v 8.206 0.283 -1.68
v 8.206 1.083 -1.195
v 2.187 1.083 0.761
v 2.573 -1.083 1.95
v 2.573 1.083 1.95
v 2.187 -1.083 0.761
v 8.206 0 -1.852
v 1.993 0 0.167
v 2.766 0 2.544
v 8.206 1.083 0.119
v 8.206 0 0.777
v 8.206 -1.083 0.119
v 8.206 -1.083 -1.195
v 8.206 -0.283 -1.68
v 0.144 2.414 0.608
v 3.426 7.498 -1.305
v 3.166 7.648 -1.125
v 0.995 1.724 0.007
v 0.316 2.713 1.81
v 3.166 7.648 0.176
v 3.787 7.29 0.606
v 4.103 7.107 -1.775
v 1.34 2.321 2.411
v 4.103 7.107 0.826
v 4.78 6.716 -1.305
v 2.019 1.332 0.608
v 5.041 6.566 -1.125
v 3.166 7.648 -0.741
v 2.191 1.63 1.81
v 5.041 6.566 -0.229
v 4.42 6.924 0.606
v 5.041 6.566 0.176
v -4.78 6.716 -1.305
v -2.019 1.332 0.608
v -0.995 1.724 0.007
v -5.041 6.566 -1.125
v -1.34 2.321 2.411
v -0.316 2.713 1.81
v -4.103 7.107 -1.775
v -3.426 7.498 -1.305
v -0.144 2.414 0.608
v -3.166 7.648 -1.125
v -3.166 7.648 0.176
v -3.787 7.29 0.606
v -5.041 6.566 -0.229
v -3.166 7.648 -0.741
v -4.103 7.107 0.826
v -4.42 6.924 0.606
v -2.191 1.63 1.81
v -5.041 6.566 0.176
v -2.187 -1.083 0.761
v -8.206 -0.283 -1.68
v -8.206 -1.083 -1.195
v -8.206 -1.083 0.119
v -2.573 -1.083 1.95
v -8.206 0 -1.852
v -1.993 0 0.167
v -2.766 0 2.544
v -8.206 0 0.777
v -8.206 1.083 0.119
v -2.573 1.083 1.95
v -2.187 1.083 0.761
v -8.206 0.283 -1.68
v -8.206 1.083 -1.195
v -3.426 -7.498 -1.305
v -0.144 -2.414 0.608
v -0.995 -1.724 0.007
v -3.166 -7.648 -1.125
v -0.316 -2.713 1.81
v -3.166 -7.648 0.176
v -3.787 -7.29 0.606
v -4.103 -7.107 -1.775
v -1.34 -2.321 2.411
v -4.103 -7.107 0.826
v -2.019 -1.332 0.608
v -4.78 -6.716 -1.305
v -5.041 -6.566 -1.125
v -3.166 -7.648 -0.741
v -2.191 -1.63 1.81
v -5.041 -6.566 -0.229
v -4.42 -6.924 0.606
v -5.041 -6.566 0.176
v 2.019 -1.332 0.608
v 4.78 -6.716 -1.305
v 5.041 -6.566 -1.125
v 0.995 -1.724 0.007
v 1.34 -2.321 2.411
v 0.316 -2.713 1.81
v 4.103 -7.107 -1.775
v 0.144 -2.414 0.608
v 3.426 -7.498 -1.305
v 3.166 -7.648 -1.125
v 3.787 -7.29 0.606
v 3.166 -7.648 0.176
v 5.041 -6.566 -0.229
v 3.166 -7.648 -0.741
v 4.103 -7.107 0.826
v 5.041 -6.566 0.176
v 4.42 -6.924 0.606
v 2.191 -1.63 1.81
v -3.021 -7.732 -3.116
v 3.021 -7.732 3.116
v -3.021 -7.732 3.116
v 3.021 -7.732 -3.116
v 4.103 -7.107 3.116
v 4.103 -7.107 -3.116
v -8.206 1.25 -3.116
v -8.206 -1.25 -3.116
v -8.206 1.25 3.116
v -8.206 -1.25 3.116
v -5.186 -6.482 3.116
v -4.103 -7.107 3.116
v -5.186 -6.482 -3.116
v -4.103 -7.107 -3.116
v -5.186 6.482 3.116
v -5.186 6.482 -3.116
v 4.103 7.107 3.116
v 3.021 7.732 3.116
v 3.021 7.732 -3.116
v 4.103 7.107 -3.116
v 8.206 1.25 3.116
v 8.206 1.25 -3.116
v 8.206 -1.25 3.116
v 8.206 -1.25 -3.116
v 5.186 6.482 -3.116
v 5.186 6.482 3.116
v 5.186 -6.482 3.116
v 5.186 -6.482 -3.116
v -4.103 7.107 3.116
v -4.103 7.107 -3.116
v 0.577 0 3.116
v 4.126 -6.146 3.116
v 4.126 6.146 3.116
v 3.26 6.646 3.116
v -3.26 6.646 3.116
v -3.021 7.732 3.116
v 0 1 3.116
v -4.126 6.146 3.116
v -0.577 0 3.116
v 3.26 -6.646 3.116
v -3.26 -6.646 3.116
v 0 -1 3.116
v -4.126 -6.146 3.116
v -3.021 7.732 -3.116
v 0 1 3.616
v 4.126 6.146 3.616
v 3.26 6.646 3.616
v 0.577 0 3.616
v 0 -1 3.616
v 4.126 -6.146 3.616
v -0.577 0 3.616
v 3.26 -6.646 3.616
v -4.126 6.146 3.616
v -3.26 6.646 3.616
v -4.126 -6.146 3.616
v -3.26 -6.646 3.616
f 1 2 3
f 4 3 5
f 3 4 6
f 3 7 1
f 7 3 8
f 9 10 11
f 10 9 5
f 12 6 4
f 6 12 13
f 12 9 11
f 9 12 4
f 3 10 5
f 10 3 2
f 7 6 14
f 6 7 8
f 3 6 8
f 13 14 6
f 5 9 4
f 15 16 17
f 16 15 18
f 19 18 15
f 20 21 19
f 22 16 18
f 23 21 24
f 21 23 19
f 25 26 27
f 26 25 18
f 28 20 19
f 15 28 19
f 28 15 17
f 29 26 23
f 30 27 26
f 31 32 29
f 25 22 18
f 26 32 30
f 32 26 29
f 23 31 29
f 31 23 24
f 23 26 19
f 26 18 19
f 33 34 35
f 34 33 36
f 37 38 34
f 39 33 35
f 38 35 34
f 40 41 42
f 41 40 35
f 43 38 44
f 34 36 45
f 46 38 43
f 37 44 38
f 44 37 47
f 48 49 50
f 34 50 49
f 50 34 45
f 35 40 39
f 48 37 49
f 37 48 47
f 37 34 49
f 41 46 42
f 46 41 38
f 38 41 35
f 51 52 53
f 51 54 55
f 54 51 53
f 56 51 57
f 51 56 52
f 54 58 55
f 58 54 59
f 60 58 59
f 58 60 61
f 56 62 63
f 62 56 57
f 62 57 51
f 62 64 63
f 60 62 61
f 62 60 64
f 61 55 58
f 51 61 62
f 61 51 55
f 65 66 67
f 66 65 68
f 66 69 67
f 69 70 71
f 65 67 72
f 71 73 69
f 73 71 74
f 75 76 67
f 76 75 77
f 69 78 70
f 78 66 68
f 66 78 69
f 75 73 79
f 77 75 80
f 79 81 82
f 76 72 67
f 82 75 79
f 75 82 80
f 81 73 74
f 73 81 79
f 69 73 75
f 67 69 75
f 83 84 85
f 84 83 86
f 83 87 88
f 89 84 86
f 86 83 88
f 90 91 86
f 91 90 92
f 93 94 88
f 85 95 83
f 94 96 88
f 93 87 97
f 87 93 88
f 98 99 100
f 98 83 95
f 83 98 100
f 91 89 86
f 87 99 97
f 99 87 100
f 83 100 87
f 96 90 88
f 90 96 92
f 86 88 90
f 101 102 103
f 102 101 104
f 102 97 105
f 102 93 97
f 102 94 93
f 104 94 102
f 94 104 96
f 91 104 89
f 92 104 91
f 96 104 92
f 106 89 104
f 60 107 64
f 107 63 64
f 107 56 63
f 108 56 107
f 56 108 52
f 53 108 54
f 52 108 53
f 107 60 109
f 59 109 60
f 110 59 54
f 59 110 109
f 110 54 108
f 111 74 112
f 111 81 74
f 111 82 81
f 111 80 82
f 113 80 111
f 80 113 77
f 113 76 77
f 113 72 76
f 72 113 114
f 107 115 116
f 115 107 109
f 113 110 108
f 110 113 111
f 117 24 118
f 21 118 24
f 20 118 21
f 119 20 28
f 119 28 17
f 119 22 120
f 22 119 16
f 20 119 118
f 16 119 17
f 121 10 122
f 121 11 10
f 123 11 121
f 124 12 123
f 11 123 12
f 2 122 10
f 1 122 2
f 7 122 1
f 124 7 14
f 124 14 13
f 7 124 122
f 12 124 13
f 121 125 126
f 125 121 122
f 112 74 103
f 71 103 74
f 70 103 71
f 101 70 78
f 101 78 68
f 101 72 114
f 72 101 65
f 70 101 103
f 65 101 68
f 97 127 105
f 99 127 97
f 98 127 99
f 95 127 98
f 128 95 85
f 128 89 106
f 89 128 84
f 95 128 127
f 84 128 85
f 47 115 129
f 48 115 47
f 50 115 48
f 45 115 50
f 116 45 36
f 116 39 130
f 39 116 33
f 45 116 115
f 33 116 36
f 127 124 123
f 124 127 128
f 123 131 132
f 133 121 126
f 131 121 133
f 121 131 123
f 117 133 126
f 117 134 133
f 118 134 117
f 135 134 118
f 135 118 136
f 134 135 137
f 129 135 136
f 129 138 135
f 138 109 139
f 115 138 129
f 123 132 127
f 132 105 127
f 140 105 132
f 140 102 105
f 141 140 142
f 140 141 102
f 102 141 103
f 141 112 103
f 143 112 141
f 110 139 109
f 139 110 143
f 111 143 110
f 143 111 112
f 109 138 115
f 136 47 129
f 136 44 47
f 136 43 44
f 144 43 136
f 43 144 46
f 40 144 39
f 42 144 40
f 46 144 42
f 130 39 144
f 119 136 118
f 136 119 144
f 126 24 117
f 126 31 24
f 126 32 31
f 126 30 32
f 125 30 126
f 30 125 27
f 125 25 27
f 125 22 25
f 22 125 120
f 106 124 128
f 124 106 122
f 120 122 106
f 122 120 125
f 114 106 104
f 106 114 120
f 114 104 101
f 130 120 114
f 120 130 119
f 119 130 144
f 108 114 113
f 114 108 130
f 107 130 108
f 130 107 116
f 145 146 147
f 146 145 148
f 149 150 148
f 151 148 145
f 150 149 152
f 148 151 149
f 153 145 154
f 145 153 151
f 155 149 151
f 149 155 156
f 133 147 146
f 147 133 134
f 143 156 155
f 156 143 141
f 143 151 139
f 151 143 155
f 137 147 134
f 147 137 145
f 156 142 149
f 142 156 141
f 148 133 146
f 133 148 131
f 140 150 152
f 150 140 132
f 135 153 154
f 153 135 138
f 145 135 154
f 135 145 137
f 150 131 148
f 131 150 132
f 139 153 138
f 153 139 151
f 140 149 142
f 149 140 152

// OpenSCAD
//---------------------------------------------------------------------------------------------
//-- Mini-dome.  Derived from the Domekit-2V from effallo
//---------------------------------------------------------------------------------------------
//-- HEXA-CONNECTORS
//-- The connectors are parameterized. On the top there is an "X"
//-- showing the 4 holes were the long sticks should be connected
//---------------------------------------------------------------------------------------------
//-- (c) Jul-2012 Juan Gonzalez-Gomez (Obijuan) juan@iearobotics.com
//-- Released under the GPL license
//--------------------------------------------------------------------------------------------
/* Derived from:
   DOMEKIT-2V • HEXAGON
   http://effalo.com
*/

//-- Two Domes as examples:
//-- All the calculations have been done using this link:
//--  http://simplydifferently.org/Geodesic_Dome_Notes?page=3#2V/L2

/*  EXAMPLE 1 (default): Micro-dome

   Diameter: 150 mm
   Height: 75mm
   20 x Hexa-connectors
   6  x  Penta-connectors
   35 x Long sticks: 46.3mm (Green)
   30 x shot sticks: 41mm (Red)
*/

/*  EXAMPLE 2: Mini-dome

   Diameter: 50cm
   Height: 25cm
   20 x Hexa-connectors
   6  x  Penta-connectors
   35 x Long sticks: 154.5 mm (Green)
   30 x shot sticks: 136.6 mm (Red)
*/


//----------------------------------------------------------------------------------------------------
//--  Module for creating the main body of the hexagonal connectors
//--  Parameters:
//--      r :  Hexagon radius
//--      h:  Hub height
//--      s:  Stick diameter
//-------------------------------------------------------------------------------------------------------
module hexa_hub_main(r,h,s)
{
  hull() {
    cylinder(r=r, h=h,center=true,$fn=6);

     for (i=[0:5]) {
       rotate([0,0,i*60])
         translate([r-s/2,0,0])
           cube([s,s, h],center=true);
    }
  }
}

//----------------------------------------------------------------------------------
//-- Hexagonal connector
//-- Input parameters
//--     sd: stick diameter
//--     holedepth
//--
//--    The total part height and diameter are calculated 
//--   accorting to these two USER parameters
//----------------------------------------------------------------------------------
module hexa_hub(sd=2.5, holedepth=6)
{
  
  //-- Temp variable. Length of the cilinders used for 
  //-- making the drills on the main hub. 

  length = holedepth + sd*sin(18)+2;

  //-- Z angle of the drills. All have 16 degrees except 2 of 18
  zangle = [18,16,16,18,16,16];

  //-- Color of the drills (for debuggin)
  hole_color=["red","blue","blue","red","blue","blue"];

  //-- Calculate the main hub parameters: radius and height
  //-- They are calculated from the stick diameter and holedepth
  hub_r = sd + holedepth*cos(18);
  hub_h = holedepth*sin(18)+sd*cos(18) + 1+1;

  //-- Debugin: Output the calculated parameters
  echo("Diameter: ",2*hub_r);
  echo("Height: ",hub_h);

  //-- The part consist of sub-parts:
  //--  1) The main hub: an hexagon 
  //--  2) The drills 
  //--  3) The top part for indicating where the long stick
  //---     should be connected

  union() {

    //-- This is the part without the "X" on the TOP
    difference() {
      //-- Main hub
      hexa_hub_main(r=hub_r, h=hub_h,s=sd);

      //-- Holes for inserting the sticks
      for (i=[0:5]) {
         rotate([0,0,i*60])
          translate([length/2+sd*sqrt(3)/2,0,0])
            rotate([0,90+zangle[i],0])
              color(hole_color[i]) cylinder(r=sd/2, h=length, center=true, $fn=6);
      }
    }

    //-- Top part: The "X"
    color("blue")
    rotate([0,0,60])
      translate([0,0,hub_h/2])
        cube([2*hub_r*0.9,1,1],center=true);

    color("blue")
      rotate([0,0,-60])
        translate([0,0,hub_h/2])
          cube([2*hub_r*0.9,1,1],center=true);

  } //-- end union

} //-- End module


//-----------------------------------------------------------------------------------------
//-- DEFINED BY THE USER:
//-- uncomment the connects to use, or set the parameters
//----------------------------------------------------------------------------------------

//-- Default: Micro-dome
hexa_hub();

//-- Mini Dome:
//hexa_hub(sd=3.4, holedepth=10);
